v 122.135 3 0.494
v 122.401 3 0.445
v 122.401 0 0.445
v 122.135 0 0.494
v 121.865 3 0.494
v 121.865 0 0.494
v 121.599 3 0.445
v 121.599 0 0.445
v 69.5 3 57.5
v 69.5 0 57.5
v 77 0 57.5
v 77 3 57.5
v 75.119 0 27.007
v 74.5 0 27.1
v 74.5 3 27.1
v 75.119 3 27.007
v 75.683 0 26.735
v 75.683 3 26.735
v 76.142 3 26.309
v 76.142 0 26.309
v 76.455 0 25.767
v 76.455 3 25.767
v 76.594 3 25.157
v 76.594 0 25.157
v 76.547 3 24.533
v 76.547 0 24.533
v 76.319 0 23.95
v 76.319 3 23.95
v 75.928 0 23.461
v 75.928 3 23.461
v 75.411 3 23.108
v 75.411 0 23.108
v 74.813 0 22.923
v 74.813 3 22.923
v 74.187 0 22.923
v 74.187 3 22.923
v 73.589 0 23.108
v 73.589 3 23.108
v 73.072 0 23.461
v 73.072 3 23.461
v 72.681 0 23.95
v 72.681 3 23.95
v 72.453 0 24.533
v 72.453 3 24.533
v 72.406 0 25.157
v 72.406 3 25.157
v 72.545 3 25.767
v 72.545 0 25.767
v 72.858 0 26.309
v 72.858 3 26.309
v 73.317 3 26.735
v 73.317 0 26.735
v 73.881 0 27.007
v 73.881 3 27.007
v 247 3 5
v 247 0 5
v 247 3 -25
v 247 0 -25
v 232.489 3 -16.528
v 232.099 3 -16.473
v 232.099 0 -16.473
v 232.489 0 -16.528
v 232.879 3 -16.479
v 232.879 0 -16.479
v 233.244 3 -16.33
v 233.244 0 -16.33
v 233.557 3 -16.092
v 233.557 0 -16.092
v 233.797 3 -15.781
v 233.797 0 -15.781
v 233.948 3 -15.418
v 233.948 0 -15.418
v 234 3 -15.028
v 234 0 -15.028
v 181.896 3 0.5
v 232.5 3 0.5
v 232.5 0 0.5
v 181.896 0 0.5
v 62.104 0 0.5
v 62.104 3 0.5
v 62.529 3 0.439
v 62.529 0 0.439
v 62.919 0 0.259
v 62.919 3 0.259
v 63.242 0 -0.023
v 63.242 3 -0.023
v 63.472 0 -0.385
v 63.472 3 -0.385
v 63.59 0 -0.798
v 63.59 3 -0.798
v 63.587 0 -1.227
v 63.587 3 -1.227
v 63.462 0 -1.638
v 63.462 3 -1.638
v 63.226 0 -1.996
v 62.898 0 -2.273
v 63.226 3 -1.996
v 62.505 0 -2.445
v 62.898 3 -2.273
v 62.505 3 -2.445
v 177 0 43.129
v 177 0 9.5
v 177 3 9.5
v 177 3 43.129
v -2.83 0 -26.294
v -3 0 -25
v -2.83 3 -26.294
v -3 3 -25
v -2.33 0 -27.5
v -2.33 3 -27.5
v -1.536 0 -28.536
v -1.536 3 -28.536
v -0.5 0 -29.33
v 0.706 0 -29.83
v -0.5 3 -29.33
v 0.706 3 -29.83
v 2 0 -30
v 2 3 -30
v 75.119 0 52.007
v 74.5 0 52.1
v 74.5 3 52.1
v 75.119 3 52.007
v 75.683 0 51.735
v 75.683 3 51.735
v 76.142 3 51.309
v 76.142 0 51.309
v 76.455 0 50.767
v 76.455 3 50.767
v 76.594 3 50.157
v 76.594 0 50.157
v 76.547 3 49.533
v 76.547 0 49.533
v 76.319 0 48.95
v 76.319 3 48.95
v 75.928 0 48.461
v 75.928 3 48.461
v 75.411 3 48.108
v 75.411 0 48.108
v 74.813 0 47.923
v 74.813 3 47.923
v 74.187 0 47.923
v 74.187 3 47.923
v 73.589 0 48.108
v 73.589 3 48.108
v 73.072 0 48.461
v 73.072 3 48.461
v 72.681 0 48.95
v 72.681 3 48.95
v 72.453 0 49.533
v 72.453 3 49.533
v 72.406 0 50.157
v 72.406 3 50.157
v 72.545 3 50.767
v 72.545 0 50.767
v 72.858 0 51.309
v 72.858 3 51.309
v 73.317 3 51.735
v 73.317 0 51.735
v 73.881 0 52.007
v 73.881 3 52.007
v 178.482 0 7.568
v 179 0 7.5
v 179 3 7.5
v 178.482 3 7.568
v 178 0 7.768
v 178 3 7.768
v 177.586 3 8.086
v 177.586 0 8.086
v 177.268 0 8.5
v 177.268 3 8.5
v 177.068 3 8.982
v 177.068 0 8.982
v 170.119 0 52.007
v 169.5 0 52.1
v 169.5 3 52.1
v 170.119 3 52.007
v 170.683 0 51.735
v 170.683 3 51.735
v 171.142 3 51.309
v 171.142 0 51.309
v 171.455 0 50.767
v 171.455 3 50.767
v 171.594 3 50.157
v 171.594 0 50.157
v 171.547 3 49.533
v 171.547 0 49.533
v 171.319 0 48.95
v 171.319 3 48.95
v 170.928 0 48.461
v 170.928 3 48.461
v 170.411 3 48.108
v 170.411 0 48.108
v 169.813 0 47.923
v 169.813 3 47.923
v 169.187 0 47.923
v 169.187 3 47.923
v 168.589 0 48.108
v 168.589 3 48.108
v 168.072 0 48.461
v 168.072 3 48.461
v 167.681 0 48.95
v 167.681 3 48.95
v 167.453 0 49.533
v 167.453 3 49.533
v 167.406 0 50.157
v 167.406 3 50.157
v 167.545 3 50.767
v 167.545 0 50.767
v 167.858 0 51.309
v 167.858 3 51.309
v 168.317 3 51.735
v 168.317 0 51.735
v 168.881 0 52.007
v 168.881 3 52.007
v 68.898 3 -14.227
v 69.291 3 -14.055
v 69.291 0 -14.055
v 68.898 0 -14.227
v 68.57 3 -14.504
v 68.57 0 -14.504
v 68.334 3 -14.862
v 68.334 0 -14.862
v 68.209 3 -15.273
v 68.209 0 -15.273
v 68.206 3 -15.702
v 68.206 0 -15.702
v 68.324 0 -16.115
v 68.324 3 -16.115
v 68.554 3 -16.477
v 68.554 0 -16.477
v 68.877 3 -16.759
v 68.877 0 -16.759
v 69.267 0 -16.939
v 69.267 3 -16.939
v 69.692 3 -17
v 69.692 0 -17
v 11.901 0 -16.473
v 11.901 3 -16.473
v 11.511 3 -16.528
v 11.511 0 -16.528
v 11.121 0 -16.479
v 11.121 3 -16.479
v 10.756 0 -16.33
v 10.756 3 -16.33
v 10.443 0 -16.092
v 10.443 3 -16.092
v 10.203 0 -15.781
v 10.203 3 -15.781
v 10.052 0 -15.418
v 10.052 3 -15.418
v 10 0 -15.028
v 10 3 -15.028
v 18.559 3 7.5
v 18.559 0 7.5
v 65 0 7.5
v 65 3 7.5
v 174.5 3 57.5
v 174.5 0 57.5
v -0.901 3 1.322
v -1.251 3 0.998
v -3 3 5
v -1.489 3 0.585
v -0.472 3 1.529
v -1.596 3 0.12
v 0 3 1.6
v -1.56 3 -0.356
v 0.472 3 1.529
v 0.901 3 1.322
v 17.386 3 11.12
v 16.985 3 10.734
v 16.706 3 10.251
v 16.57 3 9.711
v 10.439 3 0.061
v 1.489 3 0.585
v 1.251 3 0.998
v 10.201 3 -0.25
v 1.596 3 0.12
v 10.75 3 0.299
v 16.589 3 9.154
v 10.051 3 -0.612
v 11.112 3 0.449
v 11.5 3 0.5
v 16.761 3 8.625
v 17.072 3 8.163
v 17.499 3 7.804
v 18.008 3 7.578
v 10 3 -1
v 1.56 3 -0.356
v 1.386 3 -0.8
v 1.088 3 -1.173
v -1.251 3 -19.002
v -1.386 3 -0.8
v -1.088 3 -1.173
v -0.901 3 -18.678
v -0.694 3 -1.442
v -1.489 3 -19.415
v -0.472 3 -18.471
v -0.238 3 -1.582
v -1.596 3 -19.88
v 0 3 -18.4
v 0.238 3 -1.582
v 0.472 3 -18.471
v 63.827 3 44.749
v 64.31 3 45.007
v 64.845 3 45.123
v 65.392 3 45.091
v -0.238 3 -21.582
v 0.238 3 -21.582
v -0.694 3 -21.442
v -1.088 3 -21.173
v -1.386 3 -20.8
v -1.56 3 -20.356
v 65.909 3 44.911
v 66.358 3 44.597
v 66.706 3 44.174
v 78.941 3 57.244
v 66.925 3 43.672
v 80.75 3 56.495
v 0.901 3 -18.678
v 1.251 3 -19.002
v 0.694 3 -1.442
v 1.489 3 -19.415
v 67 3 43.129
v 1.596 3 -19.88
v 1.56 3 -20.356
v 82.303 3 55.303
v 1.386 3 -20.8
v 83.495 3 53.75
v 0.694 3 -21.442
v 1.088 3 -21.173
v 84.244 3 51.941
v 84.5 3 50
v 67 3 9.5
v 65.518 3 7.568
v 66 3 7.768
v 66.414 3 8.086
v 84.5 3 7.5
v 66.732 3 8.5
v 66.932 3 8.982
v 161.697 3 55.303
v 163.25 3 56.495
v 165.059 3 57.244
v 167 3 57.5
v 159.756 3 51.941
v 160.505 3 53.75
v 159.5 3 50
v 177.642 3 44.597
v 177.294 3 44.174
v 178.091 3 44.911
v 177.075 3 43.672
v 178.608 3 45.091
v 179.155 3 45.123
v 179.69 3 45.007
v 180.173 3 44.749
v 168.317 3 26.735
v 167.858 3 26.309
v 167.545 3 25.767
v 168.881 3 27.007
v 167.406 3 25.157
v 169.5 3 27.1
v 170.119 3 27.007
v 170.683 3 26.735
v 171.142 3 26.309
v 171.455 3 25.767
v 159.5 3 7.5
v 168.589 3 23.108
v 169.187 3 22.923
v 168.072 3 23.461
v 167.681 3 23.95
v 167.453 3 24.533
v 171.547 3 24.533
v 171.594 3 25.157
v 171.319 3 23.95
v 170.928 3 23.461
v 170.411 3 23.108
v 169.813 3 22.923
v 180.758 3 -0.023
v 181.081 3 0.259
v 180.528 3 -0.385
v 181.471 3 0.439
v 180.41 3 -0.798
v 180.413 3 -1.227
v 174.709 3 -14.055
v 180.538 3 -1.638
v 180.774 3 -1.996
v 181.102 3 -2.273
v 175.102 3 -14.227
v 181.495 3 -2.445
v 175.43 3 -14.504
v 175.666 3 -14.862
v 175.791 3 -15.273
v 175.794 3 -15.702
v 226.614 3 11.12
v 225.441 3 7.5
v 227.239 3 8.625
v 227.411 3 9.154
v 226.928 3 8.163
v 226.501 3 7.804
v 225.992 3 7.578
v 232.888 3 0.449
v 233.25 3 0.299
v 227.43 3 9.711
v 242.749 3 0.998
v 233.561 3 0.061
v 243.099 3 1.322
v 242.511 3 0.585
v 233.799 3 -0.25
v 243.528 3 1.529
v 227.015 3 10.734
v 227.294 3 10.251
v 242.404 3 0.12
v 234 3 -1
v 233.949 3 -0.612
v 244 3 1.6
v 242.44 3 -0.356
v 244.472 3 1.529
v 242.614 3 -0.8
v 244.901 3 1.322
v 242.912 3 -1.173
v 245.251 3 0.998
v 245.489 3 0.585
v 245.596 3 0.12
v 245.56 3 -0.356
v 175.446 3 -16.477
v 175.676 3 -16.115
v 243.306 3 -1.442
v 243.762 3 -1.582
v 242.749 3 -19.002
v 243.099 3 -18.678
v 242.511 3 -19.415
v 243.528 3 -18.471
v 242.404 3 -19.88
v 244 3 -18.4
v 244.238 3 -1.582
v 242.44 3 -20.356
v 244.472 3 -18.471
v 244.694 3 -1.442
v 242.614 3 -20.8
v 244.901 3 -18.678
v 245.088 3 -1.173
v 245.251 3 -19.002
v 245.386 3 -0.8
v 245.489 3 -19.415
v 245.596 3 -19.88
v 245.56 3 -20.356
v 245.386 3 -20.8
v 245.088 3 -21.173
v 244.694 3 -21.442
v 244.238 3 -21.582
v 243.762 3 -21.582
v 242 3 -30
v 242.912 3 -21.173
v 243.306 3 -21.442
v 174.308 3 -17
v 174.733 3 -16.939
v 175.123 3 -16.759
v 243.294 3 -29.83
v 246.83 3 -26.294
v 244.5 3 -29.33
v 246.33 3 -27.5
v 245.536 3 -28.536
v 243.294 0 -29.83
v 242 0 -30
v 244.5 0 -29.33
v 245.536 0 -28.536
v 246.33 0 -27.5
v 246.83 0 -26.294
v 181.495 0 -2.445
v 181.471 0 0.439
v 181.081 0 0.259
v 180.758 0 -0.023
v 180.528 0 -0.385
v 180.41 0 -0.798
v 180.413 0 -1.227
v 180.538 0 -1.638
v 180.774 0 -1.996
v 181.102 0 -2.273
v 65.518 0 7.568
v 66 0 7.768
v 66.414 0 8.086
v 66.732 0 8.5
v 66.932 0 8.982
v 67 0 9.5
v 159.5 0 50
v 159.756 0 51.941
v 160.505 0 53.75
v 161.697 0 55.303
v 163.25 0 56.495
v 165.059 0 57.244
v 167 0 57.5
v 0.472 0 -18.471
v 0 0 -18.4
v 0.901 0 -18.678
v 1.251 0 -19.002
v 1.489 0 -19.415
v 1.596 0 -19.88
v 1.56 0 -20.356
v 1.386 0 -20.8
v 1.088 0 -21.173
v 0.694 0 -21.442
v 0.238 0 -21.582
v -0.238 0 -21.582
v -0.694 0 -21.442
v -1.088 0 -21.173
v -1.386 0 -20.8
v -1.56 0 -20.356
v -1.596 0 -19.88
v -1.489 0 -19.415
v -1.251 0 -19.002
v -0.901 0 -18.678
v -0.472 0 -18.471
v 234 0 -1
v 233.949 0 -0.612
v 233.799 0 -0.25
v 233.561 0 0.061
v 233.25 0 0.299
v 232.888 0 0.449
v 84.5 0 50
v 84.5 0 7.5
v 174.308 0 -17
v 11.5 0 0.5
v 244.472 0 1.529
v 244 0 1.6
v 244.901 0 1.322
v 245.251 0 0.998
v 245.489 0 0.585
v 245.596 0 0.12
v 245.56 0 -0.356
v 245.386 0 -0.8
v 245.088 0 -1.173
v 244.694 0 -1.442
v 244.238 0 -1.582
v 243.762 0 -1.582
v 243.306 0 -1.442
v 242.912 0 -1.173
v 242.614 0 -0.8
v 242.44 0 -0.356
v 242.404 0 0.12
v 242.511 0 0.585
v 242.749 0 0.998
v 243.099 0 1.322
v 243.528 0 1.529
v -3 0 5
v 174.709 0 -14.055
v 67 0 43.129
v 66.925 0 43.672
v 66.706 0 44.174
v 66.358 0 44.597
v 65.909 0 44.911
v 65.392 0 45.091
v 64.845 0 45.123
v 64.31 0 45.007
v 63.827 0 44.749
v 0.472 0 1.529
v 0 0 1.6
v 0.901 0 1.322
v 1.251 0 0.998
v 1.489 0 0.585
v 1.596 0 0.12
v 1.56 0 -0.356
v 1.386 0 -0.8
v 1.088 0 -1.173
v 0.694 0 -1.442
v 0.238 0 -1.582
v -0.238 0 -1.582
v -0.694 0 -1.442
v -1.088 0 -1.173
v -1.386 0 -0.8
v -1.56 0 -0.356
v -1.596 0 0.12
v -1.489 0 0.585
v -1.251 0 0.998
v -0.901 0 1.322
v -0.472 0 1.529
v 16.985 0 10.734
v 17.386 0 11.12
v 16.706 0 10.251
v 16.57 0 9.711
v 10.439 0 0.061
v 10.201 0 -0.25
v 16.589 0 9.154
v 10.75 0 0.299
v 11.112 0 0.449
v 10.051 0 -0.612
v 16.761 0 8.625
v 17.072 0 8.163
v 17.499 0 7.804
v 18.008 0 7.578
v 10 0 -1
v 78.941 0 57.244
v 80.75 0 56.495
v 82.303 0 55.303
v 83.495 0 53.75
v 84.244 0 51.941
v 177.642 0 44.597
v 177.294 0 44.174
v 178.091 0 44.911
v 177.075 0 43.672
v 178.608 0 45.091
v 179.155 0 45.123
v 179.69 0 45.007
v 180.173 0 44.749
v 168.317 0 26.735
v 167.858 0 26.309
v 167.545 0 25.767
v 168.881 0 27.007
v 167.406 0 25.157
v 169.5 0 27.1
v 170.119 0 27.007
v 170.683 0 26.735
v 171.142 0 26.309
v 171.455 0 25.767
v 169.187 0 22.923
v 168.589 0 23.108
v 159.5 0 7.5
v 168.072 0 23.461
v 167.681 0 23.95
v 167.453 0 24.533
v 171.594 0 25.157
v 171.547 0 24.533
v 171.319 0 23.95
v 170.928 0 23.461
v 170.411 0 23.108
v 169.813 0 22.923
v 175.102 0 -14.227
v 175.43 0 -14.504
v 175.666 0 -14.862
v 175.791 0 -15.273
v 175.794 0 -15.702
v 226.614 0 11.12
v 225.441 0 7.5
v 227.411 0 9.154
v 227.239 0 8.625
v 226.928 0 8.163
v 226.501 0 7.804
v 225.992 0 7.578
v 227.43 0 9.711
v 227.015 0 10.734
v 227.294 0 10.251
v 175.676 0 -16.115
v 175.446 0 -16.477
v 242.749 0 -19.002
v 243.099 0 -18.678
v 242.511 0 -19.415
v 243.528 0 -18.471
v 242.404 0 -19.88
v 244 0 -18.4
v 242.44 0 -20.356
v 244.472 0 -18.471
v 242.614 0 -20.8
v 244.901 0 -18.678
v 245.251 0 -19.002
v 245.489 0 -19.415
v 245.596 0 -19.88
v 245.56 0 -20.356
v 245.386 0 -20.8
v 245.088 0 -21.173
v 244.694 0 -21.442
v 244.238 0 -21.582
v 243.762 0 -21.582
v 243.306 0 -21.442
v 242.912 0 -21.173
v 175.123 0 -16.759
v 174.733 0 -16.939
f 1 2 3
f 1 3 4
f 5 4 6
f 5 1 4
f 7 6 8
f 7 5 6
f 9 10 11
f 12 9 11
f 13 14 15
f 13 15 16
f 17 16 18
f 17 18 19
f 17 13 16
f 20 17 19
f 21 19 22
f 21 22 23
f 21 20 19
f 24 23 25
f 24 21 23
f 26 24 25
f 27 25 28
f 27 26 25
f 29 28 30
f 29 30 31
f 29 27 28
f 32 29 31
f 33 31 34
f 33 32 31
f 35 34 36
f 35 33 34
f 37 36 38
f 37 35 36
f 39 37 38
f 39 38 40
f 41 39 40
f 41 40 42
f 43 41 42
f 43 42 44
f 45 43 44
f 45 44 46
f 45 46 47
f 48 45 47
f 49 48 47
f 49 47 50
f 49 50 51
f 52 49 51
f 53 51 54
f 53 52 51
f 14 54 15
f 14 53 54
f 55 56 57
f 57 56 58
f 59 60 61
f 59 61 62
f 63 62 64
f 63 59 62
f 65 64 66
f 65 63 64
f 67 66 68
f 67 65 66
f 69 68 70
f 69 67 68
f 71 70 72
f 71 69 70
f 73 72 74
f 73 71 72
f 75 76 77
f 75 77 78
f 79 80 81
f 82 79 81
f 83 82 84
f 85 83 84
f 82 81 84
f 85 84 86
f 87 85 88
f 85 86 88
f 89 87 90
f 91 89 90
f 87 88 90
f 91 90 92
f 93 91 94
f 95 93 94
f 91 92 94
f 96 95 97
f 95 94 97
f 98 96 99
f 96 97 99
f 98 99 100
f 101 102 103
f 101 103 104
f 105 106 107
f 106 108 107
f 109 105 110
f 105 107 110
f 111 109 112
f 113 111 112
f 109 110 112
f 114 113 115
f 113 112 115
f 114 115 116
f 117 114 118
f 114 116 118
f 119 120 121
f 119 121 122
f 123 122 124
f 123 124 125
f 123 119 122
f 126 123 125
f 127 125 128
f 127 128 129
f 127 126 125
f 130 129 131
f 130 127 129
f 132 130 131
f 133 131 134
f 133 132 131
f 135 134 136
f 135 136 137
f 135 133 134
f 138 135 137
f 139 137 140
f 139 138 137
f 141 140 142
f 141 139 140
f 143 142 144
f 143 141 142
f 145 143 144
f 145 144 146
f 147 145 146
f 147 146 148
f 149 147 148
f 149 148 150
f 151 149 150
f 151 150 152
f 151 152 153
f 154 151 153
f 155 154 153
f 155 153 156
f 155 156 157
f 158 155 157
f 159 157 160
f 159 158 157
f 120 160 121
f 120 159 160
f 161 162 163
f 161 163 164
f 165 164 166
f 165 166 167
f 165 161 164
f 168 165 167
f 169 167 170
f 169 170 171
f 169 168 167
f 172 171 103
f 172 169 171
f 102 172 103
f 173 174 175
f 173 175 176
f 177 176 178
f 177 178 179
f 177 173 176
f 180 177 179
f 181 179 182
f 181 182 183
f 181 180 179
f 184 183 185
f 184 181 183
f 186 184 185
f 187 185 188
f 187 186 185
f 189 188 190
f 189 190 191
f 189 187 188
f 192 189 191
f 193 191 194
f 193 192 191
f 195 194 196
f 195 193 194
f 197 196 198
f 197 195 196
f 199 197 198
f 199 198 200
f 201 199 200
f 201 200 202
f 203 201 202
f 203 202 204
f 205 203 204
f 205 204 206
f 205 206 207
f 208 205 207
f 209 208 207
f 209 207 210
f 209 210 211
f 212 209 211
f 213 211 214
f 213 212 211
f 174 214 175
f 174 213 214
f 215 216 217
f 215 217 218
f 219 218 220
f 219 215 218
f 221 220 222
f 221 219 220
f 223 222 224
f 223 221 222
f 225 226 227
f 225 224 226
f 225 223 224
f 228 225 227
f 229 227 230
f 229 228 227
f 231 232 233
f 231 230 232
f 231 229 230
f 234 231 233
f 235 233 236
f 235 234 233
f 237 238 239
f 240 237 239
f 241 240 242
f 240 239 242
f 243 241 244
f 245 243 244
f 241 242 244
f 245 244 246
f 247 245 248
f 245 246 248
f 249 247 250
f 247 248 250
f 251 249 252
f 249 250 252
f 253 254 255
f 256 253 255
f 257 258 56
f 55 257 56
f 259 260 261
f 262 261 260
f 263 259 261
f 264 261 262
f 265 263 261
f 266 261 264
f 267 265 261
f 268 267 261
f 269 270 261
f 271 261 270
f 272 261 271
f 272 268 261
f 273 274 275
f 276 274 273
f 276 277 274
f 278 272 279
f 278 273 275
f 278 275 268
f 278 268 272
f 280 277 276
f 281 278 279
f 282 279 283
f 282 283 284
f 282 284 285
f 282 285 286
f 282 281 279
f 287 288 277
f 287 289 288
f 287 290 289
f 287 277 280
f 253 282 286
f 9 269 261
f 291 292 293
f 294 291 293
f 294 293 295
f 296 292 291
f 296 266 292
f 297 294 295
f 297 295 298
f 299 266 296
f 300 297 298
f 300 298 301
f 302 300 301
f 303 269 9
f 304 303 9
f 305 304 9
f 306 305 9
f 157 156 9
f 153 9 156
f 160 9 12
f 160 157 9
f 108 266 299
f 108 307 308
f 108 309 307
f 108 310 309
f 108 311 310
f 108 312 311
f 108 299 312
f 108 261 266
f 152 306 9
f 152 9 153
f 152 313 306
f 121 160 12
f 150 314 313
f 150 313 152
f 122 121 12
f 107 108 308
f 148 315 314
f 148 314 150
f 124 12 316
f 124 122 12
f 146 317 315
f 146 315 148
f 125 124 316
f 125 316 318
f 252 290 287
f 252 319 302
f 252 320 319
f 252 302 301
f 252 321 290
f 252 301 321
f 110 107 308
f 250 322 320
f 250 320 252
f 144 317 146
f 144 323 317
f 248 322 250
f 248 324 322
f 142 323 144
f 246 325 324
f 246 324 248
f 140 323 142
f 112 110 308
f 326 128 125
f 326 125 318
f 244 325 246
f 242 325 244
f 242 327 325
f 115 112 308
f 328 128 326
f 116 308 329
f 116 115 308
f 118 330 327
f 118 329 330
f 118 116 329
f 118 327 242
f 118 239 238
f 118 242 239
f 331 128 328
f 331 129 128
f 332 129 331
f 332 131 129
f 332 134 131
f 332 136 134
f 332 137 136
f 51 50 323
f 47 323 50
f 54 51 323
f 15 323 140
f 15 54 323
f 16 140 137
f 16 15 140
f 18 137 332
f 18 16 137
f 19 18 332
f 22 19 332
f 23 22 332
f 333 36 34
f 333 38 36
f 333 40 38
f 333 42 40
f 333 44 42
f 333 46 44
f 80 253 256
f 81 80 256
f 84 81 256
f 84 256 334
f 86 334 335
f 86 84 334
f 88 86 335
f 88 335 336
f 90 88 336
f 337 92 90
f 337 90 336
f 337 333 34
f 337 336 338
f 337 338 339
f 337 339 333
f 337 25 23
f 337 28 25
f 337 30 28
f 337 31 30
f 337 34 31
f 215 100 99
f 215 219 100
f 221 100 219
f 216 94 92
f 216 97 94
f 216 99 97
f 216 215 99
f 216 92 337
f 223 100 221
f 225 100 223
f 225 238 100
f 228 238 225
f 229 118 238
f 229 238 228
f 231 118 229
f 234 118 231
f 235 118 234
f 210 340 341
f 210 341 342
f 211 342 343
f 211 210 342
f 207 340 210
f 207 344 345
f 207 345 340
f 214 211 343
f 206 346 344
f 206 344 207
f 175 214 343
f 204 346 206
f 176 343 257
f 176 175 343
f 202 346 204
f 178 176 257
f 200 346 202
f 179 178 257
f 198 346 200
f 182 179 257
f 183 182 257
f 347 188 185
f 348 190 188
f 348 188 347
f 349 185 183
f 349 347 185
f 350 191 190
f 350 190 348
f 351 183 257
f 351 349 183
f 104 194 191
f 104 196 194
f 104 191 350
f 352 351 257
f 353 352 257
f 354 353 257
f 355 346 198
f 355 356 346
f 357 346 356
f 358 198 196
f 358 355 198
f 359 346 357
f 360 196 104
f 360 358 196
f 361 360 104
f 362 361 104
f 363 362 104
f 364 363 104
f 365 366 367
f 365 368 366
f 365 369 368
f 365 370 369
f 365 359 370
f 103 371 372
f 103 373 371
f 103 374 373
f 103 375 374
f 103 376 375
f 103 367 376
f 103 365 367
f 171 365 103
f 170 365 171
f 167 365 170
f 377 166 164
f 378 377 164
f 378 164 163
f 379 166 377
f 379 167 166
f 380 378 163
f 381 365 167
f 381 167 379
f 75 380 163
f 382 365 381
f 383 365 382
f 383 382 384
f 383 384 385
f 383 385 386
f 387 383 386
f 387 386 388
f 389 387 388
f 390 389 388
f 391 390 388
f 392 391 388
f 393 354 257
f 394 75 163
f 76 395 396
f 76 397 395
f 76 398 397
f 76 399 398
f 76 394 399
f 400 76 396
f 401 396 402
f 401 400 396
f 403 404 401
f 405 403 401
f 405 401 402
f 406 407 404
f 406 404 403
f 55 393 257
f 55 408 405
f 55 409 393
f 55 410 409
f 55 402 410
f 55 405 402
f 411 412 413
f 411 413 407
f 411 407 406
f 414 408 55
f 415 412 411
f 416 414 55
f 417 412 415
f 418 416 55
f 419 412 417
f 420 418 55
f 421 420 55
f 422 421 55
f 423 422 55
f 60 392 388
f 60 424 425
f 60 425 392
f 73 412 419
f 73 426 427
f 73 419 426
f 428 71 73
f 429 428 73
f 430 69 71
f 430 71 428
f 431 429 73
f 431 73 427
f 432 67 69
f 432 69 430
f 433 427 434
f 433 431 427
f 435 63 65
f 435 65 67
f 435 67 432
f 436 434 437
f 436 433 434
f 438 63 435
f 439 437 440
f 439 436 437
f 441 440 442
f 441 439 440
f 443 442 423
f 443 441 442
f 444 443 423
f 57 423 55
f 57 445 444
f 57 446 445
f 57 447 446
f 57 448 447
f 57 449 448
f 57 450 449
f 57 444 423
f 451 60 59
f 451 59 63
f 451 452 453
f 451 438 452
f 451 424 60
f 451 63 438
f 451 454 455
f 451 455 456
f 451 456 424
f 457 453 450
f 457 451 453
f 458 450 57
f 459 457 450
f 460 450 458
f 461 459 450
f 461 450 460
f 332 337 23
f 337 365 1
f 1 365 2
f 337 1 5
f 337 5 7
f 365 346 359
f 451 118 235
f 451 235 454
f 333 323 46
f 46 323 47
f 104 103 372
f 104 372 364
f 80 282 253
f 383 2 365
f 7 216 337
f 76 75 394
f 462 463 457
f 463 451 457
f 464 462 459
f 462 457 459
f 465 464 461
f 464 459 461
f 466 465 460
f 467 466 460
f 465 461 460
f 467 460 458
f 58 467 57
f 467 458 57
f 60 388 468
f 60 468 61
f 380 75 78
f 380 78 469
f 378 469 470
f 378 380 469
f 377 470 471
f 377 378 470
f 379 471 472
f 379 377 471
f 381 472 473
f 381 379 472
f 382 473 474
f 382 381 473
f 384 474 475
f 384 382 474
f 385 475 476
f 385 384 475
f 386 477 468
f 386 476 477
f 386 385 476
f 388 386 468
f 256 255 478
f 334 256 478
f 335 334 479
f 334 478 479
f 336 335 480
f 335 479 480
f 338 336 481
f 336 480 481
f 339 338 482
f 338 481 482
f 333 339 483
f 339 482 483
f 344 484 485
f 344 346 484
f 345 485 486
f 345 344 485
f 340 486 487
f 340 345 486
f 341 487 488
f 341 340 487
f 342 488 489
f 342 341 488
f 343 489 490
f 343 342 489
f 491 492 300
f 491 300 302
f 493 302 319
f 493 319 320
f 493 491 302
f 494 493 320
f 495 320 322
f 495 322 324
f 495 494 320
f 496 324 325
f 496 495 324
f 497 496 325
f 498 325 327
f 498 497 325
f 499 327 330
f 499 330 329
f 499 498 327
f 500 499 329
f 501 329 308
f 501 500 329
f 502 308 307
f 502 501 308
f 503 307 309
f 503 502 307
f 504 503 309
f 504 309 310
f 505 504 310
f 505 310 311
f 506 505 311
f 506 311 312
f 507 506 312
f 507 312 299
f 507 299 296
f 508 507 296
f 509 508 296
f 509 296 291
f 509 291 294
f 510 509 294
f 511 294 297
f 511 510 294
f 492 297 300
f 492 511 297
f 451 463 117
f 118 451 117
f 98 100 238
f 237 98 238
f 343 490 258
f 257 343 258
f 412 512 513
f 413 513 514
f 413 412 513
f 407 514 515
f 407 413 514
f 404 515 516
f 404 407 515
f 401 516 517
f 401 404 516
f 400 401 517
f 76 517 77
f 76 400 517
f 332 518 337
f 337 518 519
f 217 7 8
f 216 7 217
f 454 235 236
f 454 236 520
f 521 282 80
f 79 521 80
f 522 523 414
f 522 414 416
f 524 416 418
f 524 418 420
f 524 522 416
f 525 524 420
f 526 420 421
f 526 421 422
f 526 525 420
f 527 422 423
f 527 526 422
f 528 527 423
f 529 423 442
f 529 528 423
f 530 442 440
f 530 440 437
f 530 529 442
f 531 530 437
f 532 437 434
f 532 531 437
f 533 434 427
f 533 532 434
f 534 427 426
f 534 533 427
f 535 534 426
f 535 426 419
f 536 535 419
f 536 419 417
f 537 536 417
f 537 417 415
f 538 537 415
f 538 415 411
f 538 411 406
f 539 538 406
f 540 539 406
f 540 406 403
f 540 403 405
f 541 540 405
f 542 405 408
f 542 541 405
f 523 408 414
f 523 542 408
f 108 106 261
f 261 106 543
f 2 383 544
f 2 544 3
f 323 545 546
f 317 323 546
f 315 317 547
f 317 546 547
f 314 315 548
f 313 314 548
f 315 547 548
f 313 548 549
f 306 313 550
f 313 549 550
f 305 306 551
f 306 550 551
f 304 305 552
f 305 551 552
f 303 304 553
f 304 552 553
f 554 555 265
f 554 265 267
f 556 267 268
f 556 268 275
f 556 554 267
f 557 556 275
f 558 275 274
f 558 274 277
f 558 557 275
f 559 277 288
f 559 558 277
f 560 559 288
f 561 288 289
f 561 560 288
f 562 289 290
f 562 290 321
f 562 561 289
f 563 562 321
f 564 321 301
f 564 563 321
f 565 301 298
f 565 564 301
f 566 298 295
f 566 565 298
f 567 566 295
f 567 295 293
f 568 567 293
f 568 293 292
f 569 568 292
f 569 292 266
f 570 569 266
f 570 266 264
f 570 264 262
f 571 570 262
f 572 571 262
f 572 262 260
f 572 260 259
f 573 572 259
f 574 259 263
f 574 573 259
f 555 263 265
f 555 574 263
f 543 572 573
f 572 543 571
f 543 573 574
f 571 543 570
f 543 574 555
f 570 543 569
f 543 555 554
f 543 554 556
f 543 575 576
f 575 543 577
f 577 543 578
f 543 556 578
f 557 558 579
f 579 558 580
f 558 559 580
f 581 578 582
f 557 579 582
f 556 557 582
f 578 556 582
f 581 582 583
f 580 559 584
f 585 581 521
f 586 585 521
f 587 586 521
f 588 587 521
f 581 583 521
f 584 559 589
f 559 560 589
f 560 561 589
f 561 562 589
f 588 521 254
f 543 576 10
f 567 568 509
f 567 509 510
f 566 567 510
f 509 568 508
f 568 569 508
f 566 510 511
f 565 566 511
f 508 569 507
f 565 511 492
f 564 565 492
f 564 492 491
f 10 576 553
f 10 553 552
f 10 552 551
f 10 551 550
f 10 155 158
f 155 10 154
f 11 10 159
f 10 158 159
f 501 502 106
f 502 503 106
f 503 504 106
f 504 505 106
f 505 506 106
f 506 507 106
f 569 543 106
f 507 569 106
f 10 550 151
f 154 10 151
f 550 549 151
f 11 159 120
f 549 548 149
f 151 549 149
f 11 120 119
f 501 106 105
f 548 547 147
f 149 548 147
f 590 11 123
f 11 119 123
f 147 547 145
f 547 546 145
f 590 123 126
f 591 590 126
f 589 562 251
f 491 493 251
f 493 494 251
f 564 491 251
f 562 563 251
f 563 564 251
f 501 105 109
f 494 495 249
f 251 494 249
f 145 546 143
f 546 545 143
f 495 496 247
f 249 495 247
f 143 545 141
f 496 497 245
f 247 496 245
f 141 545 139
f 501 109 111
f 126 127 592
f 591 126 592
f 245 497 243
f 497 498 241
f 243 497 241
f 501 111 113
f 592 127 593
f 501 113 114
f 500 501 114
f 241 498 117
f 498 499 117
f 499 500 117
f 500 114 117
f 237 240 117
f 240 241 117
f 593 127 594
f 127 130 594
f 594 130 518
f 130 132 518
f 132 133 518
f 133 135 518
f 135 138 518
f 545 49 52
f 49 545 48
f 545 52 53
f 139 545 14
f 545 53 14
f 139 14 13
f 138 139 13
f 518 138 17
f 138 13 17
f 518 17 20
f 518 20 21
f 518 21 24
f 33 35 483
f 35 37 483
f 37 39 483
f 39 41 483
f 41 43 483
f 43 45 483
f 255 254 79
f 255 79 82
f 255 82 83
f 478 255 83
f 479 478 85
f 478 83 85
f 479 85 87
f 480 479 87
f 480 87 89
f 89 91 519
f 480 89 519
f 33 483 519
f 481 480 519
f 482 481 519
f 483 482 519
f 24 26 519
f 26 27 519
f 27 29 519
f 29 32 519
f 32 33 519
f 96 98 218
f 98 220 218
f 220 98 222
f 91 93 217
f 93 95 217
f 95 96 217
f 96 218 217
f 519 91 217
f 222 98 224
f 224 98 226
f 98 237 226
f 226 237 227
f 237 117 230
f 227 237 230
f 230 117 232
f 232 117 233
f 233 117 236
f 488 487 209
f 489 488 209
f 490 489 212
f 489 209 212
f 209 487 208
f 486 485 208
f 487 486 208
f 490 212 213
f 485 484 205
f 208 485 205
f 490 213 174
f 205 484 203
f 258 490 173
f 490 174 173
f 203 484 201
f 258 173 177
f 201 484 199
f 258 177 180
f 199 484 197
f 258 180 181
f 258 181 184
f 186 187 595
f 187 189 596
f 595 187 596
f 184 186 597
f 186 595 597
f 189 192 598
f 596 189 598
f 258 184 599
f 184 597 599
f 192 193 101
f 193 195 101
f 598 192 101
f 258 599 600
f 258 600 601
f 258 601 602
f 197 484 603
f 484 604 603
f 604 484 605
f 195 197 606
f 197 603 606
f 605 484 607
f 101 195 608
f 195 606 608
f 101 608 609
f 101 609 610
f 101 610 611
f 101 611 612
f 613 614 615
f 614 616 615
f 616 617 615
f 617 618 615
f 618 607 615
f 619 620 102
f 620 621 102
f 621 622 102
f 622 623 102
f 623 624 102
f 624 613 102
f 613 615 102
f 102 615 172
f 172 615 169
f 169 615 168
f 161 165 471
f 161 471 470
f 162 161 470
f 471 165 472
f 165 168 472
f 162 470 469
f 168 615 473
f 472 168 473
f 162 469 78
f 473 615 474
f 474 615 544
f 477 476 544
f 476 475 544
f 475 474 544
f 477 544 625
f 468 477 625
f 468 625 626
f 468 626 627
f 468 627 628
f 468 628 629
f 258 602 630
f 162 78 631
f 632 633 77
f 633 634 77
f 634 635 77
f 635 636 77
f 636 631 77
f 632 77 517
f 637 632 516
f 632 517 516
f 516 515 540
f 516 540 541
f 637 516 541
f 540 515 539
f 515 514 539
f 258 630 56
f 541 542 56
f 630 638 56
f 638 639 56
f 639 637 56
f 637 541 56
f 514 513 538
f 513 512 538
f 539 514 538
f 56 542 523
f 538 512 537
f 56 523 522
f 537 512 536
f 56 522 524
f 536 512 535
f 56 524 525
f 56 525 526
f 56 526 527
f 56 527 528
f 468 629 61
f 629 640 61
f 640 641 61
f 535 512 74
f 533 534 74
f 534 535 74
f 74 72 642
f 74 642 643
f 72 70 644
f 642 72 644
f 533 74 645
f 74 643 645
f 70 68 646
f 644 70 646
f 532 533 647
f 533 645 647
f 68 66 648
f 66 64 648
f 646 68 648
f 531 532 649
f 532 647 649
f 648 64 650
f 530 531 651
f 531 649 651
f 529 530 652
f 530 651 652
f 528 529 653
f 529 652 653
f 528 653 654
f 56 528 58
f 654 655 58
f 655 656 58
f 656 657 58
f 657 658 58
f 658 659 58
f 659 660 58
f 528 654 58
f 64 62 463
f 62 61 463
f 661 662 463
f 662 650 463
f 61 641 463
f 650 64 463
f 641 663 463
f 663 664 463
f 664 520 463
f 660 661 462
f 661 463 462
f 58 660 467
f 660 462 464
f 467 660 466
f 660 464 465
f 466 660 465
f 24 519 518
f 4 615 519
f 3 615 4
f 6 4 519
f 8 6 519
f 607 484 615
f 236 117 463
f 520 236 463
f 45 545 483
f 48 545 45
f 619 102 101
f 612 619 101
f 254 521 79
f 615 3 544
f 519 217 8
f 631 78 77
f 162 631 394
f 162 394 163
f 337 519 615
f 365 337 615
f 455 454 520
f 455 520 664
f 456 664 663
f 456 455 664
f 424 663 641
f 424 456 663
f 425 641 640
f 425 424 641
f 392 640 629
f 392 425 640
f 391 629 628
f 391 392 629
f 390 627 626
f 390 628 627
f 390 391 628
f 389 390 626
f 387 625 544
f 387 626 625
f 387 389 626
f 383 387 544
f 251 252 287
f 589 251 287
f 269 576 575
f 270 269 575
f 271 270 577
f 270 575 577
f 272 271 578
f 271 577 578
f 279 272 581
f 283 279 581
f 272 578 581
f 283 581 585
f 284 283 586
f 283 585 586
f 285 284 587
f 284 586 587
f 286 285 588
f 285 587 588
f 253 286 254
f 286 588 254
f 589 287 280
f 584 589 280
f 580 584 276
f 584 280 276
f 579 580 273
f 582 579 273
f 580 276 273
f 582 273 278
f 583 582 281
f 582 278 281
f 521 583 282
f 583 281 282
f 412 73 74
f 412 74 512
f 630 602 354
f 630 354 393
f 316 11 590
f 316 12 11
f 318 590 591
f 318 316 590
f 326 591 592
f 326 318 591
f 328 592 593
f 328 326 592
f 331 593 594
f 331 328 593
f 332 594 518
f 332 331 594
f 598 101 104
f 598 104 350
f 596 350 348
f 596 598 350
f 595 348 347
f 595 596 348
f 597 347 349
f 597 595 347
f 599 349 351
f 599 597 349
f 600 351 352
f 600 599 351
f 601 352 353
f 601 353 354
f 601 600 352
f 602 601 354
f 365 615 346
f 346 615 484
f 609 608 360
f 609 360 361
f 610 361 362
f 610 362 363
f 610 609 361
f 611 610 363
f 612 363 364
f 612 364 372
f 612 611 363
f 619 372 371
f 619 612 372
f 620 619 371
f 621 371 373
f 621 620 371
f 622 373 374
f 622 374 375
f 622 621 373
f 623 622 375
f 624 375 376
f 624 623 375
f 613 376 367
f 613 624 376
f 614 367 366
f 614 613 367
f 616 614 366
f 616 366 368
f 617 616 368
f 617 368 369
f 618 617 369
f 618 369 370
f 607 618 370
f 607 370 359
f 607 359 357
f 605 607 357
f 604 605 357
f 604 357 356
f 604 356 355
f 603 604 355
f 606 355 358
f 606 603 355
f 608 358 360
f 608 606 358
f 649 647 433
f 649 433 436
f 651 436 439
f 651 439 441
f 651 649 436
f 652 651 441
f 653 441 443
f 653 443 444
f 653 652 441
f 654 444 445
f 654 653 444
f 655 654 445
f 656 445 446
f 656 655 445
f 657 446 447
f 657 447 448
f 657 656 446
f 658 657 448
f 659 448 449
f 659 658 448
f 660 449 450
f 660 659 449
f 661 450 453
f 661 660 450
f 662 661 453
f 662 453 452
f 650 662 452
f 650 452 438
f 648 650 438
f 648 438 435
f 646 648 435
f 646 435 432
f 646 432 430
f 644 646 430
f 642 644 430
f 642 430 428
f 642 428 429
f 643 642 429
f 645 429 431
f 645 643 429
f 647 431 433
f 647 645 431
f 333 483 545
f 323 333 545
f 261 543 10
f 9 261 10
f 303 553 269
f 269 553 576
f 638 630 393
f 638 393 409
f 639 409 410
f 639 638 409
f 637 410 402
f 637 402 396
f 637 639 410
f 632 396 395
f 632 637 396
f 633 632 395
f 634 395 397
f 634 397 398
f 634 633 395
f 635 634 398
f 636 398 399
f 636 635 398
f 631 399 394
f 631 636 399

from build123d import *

# Parameters (mm, degrees)
SKETCH_1_R          = 1.6
SKETCH_1_R_2        = 2.1
EXTRUDE_1_DEPTH     = 3
FILLET_1_R          = 5
FILLET_2_R          = 7.5
CUT_EXTRUDE_1_DEPTH = 254.622258487


with BuildPart() as part:
    # 草图1 → 凸台-拉伸1 (new body)
    with BuildSketch(Plane(origin=(0, 0, 0), x_dir=(1, 0, 0), z_dir=(0, 1, 0))):
        Polygon((-3, 30), (-3, -5), (69.5, -57.5), (84.5, -57.5), (84.5, -7.5), (159.5, -7.5), (159.5, -57.5), (174.5, -57.5), (247, -5), (247, 30), align=None)
        with Locations(Location((0, 20, 0), (0, 0, 270))):
            Circle(SKETCH_1_R, mode=Mode.SUBTRACT)
        with Locations(Location((0, 0, 0), (0, 0, 270))):
            Circle(SKETCH_1_R, mode=Mode.SUBTRACT)
        with Locations(Location((244, 20, 0), (0, 0, 270))):
            Circle(SKETCH_1_R, mode=Mode.SUBTRACT)
        with Locations(Location((244, 0, 0), (0, 0, 270))):
            Circle(SKETCH_1_R, mode=Mode.SUBTRACT)
        with Locations(Location((74.5, -25, 0), (0, 0, 270))):
            Circle(SKETCH_1_R_2, mode=Mode.SUBTRACT)
        with Locations(Location((169.5, -25, 0), (0, 0, 270))):
            Circle(SKETCH_1_R_2, mode=Mode.SUBTRACT)
        with Locations(Location((74.5, -50, 0), (0, 0, 270))):
            Circle(SKETCH_1_R_2, mode=Mode.SUBTRACT)
        with Locations(Location((169.5, -50, 0), (0, 0, 270))):
            Circle(SKETCH_1_R_2, mode=Mode.SUBTRACT)
        with BuildLine():
            Line((18.559297534, -7.5), (65, -7.5))
            ThreePointArc((65, -7.5), (66.414213562, -8.085786438), (67, -9.5))
            Line((67, -9.5), (67, -43.129474199))
            ThreePointArc((67, -43.129474199), (65.909384614, -44.910771374), (63.826980376, -44.749358442))
            Line((63.826980376, -44.749358442), (17.38627791, -11.119884243))
            ThreePointArc((17.38627791, -11.119884243), (16.656698196, -8.883464716), (18.559297534, -7.5))
        make_face(mode=Mode.SUBTRACT)
        with BuildLine():
            Line((180.173019624, -44.749358442), (226.61372209, -11.119884243))
            ThreePointArc((226.61372209, -11.119884243), (227.343301804, -8.883464716), (225.440702466, -7.5))
            Line((225.440702466, -7.5), (179, -7.5))
            ThreePointArc((179, -7.5), (177.585786438, -8.085786438), (177, -9.5))
            Line((177, -9.5), (177, -43.129474199))
            ThreePointArc((177, -43.129474199), (178.090615386, -44.910771374), (180.173019624, -44.749358442))
        make_face(mode=Mode.SUBTRACT)
    extrude(amount=EXTRUDE_1_DEPTH)

    # 圆角1
    fillet_1_edges = [part.edges().sort_by_distance(p)[0] for p in [
        (247, 1.5, -30),
        (-3, 1.5, -30),
    ]]
    fillet(fillet_1_edges, radius=FILLET_1_R)

    # 圆角2
    fillet_2_edges = [part.edges().sort_by_distance(p)[0] for p in [
        (159.5, 1.5, 57.5),
        (84.5, 1.5, 57.5),
    ]]
    fillet(fillet_2_edges, radius=FILLET_2_R)

    # 草图3 → 切除-拉伸1 (cut, through all)
    with BuildSketch(Plane(origin=(0, 3, 0), x_dir=(1, 0, 0), z_dir=(0, 1, 0))):
        with BuildLine():
            Line((10, 15.02762992), (10, 1))
            ThreePointArc((10, 1), (10.439339828, -0.060660172), (11.5, -0.5))
            Line((11.5, -0.5), (62.104084647, -0.5))
            ThreePointArc((62.104084647, -0.5), (63.590394858, 0.79780713), (62.50477975, 2.445490724))
            Line((62.50477975, 2.445490724), (11.900695103, 16.473120645))
            ThreePointArc((11.900695103, 16.473120645), (10.591991921, 16.221581899), (10, 15.02762992))
        make_face()
        with BuildLine():
            Line((69.691860168, 17), (174.308139832, 17))
            ThreePointArc((174.308139832, 17), (175.794450043, 15.70219287), (174.708834935, 14.054509276))
            Line((174.708834935, 14.054509276), (122.400695103, -0.445490724))
            ThreePointArc((122.400695103, -0.445490724), (122, -0.5), (121.599304897, -0.445490724))
            Line((121.599304897, -0.445490724), (69.291165065, 14.054509276))
            ThreePointArc((69.291165065, 14.054509276), (68.205549957, 15.70219287), (69.691860168, 17))
        make_face()
        with BuildLine():
            Line((232.5, -0.5), (181.895915353, -0.5))
            ThreePointArc((181.895915353, -0.5), (180.409605142, 0.79780713), (181.49522025, 2.445490724))
            Line((181.49522025, 2.445490724), (232.099304897, 16.473120645))
            ThreePointArc((232.099304897, 16.473120645), (233.408008079, 16.221581899), (234, 15.02762992))
            Line((234, 15.02762992), (234, 1))
            ThreePointArc((234, 1), (233.560660172, -0.060660172), (232.5, -0.5))
        make_face()
    extrude(amount=-CUT_EXTRUDE_1_DEPTH, mode=Mode.SUBTRACT)


solid = part.part
